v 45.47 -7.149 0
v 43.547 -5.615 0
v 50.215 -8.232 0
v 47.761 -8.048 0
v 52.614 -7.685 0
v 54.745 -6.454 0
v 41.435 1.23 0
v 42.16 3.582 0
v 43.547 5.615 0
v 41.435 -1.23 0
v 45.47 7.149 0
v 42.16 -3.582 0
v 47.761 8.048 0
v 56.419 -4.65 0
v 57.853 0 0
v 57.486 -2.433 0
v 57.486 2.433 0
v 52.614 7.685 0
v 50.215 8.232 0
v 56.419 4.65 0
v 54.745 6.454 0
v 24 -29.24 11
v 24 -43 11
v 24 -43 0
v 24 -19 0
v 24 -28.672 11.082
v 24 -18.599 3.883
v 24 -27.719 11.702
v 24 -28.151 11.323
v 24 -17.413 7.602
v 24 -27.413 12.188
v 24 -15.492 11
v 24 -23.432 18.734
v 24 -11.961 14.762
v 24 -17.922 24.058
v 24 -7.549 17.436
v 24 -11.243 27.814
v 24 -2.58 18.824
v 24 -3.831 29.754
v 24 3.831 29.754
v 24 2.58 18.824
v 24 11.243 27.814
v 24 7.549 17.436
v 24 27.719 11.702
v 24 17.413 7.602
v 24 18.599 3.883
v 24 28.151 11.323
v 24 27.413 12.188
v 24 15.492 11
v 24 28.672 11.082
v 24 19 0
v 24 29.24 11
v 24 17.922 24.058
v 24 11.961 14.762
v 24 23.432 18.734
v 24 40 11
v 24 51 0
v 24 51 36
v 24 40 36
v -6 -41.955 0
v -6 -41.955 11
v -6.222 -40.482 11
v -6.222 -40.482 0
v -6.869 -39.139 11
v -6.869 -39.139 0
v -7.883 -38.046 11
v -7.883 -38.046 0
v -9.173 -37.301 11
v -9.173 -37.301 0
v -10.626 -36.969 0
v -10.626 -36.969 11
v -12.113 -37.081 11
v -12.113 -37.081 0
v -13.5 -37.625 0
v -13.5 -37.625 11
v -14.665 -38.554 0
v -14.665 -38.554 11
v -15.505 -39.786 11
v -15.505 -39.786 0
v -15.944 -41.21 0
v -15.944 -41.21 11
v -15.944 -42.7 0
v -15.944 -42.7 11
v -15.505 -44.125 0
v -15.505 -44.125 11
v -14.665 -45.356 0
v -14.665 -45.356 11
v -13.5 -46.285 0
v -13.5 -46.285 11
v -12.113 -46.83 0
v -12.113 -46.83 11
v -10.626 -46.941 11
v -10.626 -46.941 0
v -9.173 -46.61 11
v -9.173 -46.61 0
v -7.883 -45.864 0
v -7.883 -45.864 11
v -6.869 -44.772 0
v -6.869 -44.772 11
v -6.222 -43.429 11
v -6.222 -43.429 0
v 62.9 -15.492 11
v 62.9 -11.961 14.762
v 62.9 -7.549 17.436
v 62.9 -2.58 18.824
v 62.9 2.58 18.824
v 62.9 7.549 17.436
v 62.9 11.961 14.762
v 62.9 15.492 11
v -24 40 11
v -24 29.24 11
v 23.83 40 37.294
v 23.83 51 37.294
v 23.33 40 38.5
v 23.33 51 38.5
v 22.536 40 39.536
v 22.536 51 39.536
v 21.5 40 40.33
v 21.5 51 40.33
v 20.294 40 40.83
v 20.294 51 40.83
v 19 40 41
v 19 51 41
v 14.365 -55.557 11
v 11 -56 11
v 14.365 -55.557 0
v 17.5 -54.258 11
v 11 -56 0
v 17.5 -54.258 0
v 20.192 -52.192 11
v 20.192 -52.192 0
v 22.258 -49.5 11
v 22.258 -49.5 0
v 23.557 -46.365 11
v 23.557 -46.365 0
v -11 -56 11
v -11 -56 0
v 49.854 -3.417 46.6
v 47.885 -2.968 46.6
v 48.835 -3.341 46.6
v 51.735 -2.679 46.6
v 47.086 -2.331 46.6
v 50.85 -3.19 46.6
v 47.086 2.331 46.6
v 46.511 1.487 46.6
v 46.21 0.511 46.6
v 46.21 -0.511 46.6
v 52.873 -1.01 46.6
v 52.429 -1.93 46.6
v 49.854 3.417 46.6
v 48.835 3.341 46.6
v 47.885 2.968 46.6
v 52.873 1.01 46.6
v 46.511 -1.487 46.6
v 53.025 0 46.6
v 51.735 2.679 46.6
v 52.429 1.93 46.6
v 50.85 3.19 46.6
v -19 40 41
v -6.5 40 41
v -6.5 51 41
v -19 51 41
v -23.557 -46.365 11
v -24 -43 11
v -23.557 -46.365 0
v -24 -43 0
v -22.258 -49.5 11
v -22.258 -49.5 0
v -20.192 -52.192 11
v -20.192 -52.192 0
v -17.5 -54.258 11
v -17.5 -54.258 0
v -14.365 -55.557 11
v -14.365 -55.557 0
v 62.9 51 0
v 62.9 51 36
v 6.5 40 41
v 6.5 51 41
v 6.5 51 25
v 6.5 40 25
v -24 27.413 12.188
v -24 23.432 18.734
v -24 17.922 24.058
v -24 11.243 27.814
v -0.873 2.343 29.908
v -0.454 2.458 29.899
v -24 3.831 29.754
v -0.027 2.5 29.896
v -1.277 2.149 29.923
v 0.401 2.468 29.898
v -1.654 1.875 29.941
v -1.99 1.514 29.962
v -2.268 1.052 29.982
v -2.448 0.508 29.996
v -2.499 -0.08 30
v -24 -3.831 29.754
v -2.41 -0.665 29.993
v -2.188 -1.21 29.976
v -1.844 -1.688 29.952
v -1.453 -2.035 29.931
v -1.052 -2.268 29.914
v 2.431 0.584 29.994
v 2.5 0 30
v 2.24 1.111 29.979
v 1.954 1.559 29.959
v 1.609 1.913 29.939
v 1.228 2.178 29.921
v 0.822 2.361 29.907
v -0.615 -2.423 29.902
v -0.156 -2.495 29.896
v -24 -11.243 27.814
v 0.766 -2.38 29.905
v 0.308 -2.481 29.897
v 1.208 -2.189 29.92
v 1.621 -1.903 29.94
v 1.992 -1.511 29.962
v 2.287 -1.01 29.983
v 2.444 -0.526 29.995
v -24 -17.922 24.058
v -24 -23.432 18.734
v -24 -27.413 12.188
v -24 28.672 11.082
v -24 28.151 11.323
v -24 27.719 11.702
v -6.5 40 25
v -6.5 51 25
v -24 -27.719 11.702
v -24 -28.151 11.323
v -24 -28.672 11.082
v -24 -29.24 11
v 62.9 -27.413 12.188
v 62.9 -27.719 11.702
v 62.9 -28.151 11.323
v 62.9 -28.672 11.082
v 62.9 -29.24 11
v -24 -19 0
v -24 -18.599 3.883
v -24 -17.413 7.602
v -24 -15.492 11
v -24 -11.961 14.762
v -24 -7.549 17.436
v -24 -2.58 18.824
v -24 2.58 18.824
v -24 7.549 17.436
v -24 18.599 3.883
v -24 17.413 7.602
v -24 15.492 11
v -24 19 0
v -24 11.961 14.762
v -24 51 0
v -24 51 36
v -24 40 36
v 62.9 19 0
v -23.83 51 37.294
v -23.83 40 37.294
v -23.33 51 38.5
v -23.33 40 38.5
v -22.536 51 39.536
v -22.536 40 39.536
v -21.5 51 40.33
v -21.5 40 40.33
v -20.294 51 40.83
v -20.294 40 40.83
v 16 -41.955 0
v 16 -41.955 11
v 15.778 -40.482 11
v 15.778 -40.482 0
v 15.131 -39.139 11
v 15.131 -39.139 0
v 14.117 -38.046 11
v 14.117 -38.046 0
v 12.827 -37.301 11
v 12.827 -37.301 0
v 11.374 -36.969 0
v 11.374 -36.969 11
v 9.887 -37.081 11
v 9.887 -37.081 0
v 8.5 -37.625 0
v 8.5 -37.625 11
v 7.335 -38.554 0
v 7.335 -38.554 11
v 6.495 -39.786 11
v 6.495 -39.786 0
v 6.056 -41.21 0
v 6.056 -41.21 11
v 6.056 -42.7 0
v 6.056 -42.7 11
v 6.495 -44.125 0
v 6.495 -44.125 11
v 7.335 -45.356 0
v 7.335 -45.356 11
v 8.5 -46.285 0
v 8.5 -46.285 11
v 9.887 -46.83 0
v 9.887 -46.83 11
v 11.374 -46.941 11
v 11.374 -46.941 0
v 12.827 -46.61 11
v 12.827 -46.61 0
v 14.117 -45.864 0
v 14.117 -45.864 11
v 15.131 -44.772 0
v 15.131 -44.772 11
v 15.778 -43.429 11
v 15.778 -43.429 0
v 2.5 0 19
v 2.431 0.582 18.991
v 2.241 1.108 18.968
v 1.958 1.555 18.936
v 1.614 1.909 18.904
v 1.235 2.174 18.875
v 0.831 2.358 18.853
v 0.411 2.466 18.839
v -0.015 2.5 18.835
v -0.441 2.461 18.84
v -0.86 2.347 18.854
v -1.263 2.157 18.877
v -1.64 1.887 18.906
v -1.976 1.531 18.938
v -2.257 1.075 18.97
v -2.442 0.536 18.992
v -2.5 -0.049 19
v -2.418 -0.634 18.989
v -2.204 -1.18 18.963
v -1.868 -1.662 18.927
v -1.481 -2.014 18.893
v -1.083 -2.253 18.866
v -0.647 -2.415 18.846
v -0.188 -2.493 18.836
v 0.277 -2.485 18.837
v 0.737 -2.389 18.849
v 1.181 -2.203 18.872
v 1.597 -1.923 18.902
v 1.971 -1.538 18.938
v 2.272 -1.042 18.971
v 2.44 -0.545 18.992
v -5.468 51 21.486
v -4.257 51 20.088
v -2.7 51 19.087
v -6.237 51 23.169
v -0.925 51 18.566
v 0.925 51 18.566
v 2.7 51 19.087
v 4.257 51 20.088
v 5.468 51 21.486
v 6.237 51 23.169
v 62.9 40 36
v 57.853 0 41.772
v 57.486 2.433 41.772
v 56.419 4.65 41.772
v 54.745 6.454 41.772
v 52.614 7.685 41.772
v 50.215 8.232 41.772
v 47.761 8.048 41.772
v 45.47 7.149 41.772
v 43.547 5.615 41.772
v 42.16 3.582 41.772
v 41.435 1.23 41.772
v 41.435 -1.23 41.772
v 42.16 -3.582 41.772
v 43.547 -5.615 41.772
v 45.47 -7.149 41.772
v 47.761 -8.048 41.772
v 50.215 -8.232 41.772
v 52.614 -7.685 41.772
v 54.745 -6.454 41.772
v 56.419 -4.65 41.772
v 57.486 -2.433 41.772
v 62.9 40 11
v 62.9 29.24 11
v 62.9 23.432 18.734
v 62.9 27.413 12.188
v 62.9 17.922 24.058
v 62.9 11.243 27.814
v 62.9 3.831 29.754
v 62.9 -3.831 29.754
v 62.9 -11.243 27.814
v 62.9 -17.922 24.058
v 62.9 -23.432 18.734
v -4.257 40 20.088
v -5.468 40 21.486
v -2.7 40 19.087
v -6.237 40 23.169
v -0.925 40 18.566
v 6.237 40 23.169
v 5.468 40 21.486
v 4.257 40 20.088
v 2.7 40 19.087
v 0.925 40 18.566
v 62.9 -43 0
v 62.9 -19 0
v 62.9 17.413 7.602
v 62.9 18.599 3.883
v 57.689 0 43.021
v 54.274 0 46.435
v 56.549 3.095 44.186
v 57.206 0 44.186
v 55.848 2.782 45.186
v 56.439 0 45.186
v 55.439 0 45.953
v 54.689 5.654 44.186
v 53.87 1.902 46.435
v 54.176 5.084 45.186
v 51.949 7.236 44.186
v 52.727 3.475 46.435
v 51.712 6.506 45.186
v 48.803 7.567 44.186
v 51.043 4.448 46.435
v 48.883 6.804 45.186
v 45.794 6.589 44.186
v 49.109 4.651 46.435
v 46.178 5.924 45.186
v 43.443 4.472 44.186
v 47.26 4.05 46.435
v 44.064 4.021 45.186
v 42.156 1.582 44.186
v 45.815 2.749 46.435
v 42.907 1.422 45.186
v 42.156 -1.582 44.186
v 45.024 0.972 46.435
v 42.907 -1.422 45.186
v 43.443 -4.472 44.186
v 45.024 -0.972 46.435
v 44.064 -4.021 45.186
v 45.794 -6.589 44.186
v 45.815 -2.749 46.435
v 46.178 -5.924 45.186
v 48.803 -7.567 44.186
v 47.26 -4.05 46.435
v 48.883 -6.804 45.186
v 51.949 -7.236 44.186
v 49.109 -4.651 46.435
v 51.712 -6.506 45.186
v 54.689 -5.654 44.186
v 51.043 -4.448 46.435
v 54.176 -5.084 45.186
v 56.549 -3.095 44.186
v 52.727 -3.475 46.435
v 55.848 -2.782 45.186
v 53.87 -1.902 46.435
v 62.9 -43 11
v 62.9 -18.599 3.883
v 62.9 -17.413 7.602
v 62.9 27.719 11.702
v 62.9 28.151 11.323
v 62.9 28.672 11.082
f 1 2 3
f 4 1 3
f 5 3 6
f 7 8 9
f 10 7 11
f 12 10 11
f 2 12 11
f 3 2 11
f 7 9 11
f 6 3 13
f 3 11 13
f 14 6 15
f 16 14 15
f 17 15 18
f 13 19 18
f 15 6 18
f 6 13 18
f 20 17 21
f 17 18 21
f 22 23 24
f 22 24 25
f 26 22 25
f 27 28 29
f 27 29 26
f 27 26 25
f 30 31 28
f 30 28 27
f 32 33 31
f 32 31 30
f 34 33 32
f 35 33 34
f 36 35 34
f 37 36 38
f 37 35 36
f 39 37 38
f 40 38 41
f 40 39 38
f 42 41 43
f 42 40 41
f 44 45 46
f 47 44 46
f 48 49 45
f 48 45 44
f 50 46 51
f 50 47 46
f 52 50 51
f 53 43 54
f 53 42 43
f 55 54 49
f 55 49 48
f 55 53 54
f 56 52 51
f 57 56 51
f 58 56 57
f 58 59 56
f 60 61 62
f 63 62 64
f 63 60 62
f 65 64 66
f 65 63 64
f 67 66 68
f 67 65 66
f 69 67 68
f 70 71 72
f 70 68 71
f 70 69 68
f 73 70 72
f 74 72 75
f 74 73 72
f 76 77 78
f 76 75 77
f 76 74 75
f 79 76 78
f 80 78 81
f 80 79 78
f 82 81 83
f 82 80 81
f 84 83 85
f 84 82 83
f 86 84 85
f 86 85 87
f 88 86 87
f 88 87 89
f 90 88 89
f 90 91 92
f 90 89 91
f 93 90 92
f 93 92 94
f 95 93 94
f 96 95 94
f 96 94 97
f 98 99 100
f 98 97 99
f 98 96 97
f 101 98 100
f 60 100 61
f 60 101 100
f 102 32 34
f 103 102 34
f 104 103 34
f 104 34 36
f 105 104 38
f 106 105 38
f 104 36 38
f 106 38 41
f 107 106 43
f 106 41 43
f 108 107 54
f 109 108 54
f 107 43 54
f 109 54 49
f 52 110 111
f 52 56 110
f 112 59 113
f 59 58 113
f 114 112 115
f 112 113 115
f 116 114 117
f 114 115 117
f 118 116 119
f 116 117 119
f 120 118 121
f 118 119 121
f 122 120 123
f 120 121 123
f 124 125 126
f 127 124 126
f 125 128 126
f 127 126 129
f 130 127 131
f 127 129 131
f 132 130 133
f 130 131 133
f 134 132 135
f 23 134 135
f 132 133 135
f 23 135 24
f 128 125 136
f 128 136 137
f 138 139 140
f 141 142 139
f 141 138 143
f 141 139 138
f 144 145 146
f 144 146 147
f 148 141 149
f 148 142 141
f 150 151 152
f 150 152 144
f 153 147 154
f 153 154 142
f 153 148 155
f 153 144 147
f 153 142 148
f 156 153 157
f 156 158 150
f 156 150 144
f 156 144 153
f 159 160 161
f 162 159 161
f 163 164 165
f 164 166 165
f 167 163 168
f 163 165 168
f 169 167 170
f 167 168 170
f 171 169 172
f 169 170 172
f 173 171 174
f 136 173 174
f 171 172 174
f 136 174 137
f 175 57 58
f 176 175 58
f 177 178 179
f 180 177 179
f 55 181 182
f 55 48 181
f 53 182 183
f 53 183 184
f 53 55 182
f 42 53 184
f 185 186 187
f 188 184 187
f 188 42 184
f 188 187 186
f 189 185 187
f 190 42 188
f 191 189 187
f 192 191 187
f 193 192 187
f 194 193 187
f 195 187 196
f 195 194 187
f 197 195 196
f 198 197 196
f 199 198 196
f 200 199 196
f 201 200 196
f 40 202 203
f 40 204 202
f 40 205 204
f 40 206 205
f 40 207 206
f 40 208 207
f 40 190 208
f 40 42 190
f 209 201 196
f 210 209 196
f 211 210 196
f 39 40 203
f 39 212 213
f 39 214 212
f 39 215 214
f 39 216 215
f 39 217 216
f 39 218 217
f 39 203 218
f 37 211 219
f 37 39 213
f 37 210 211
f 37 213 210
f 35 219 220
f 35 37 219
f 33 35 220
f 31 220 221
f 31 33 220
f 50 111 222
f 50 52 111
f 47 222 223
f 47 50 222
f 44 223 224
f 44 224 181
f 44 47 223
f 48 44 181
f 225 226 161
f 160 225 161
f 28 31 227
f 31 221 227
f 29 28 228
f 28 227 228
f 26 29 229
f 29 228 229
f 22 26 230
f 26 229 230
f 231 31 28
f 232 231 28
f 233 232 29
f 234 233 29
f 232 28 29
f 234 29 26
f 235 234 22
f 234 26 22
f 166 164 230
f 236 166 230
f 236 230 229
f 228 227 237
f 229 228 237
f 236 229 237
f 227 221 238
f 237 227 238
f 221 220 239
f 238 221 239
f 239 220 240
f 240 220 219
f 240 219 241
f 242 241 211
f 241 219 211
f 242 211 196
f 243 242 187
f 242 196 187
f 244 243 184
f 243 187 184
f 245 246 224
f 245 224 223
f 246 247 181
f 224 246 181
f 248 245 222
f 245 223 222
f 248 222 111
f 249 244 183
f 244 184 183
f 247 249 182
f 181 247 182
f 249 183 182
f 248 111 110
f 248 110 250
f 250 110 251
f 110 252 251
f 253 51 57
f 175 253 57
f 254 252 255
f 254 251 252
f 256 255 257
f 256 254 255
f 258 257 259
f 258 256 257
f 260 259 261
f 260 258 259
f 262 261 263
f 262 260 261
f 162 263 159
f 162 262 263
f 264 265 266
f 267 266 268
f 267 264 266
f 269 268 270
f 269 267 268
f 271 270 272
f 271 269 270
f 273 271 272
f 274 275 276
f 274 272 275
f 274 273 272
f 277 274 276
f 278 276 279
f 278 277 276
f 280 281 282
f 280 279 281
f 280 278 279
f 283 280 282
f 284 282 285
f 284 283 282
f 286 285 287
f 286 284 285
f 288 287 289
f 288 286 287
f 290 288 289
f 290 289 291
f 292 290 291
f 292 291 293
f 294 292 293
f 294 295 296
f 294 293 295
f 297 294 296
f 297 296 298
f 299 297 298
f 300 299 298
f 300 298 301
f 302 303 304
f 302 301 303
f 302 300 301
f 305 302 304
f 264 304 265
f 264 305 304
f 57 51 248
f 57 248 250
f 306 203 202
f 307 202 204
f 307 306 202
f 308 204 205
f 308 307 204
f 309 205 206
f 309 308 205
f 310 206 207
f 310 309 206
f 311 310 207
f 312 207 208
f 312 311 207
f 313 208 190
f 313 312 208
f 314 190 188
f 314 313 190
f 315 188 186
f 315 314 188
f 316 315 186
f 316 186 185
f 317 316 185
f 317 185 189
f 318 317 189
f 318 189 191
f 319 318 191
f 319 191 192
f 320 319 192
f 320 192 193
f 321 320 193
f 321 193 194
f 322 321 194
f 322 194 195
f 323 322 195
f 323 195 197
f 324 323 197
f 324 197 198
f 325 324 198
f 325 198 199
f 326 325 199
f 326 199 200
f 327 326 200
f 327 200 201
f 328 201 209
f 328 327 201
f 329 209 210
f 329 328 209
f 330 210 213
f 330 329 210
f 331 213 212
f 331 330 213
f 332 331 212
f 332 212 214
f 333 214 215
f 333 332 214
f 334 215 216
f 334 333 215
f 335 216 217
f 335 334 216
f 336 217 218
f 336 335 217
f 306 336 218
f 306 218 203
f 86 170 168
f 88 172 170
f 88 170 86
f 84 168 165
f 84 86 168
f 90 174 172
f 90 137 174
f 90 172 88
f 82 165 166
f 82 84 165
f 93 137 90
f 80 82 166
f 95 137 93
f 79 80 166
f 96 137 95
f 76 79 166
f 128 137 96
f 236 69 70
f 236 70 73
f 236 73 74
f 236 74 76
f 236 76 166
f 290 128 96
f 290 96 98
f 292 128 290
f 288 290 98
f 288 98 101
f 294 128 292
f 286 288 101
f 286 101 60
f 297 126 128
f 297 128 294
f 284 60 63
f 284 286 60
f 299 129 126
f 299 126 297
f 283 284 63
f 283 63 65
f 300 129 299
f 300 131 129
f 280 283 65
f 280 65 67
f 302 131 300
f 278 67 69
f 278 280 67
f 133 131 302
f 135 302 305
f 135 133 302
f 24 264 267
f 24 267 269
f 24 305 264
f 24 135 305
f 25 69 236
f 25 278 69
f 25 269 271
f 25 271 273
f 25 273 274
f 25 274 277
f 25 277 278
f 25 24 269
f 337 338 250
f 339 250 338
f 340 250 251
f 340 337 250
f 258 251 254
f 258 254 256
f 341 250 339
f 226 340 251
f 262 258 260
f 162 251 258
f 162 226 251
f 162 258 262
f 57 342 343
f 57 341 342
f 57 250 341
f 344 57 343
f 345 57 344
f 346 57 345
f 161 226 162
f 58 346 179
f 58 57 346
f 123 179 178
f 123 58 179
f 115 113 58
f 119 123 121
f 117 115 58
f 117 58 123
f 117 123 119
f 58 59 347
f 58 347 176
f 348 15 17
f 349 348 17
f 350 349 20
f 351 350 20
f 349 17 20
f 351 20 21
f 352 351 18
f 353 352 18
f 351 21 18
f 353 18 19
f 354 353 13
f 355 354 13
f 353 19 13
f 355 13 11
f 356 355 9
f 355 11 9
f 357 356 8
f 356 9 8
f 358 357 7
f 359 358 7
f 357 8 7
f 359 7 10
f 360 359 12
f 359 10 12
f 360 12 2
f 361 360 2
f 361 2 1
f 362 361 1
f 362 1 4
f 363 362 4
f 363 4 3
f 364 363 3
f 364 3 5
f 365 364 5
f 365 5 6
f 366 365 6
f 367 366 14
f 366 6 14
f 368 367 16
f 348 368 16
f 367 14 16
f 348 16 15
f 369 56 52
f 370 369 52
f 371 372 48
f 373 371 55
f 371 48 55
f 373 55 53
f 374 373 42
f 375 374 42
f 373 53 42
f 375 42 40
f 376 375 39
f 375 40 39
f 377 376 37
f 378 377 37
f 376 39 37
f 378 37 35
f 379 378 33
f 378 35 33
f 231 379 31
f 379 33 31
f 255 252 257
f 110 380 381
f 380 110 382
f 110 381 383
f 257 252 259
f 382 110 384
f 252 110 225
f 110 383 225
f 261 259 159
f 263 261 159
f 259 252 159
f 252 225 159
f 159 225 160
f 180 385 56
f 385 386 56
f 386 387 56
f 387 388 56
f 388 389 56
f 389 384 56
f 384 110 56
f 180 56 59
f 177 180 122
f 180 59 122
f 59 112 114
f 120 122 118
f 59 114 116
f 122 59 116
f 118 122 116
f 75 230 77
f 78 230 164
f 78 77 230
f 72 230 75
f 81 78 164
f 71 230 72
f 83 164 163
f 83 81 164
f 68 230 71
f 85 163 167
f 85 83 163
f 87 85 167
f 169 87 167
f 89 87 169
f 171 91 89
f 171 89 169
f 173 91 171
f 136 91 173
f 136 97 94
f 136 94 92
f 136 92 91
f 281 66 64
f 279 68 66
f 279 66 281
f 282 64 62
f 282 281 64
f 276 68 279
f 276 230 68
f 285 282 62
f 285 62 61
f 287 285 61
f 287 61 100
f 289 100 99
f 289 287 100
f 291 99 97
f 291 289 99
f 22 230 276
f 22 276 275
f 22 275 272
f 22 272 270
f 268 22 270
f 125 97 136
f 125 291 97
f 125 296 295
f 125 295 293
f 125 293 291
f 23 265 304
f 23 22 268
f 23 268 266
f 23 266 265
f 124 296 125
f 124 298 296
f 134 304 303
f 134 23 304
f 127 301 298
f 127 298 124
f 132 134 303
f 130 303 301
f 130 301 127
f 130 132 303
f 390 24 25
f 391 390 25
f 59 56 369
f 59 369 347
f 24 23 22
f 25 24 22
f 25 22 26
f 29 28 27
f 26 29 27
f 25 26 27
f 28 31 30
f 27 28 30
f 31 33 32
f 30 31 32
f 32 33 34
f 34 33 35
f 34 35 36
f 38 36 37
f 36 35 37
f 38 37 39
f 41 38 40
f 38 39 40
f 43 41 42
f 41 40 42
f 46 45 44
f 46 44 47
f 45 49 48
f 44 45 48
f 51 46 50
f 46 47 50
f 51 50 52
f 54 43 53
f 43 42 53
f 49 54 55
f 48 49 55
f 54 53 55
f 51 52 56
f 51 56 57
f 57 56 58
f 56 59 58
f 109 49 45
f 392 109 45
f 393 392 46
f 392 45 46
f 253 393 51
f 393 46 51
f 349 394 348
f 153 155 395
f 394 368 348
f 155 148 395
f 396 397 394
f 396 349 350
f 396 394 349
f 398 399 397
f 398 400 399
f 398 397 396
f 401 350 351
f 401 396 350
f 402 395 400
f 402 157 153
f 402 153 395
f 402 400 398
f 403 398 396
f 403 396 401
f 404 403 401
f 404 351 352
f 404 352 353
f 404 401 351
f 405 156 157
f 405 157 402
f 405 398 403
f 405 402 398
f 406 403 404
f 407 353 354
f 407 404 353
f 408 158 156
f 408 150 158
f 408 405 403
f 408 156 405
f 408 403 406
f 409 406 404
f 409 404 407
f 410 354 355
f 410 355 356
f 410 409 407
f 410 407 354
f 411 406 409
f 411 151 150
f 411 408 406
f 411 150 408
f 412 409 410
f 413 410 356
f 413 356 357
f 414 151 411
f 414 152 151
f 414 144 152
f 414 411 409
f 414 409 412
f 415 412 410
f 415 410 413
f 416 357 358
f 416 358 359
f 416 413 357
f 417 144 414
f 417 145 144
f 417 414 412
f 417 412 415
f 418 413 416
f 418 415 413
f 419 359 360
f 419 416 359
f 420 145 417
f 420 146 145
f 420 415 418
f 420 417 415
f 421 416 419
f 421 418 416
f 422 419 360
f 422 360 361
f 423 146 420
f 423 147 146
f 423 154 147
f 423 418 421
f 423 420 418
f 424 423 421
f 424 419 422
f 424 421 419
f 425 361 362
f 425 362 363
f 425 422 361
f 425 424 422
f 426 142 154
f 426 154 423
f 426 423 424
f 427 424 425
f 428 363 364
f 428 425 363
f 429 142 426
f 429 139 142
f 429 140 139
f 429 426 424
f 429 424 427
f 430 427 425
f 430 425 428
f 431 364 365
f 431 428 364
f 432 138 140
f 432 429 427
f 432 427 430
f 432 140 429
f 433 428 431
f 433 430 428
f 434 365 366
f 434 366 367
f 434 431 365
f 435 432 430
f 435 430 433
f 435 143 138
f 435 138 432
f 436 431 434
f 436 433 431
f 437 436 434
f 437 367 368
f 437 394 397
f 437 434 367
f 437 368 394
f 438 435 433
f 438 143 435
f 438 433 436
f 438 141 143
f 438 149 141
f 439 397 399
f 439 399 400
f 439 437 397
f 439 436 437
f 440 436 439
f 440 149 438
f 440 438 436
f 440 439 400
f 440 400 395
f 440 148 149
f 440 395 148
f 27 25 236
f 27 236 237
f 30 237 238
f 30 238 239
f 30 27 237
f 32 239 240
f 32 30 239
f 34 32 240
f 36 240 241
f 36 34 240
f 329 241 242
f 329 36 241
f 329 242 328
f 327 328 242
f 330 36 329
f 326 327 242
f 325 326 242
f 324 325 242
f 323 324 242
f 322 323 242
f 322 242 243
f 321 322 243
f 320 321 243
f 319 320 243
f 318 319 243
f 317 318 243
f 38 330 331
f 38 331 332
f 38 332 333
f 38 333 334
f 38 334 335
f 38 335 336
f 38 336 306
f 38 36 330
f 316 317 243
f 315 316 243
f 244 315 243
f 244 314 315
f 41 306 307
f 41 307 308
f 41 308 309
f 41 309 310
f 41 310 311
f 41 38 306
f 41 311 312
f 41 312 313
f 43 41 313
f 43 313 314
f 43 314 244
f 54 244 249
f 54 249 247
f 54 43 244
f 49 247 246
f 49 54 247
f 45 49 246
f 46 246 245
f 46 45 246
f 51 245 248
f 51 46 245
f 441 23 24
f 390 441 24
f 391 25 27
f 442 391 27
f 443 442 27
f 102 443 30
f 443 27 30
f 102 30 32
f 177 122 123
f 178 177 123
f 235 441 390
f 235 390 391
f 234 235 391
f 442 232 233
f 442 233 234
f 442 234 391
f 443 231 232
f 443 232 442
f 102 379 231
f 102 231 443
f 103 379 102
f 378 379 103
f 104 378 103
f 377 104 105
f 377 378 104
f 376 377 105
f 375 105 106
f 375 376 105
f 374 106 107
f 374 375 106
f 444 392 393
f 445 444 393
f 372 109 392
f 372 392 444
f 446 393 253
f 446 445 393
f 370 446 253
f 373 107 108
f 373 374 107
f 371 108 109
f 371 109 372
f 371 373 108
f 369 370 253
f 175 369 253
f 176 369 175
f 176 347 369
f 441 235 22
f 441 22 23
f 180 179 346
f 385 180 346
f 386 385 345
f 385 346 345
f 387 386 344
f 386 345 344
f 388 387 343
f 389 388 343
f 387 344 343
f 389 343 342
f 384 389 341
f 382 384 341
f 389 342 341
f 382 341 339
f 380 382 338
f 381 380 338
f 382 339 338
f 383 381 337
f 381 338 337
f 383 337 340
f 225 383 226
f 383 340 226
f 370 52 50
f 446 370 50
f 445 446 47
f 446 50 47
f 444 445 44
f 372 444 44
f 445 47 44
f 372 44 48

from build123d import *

# Parameters (mm, degrees)
F0_W      = 11
F0_H      = 30
F1_DEPTH  = 24
F3_DEPTH  = 11
F4_R      = 2.5
F4_R_2    = 5
F5_DEPTH  = 41.001
F6_R      = 13
F7_R      = 5
F8_R      = 2
F9_R      = 8.2551994861
F10_DEPTH = 46.6
F11_R     = 4.8284271247
F12_DEPTH = 38.9


with BuildPart() as f1:
    # F0 (on Right) → F1 (new body, symmetric)
    with BuildSketch(Plane.YZ):
        with BuildLine():
            Line((-56, 0), (-30, 0))
            ThreePointArc((-30, 0), (-29.4730143031, 5.5983415304), (-27.9105714739, 11))
            Line((-27.9105714739, 11), (-56, 11))
            Line((-56, 11), (-56, 0))
        make_face()
        with BuildLine():
            Line((-30, 0), (-19, 0))
            ThreePointArc((-19, 0), (-18.1017503893, 5.7729223833), (-15.4919333848, 11))
            Line((-15.4919333848, 11), (-27.9105714739, 11))
            ThreePointArc((-27.9105714739, 11), (-29.4730143031, 5.5983415304), (-30, 0))
        make_face()
        with BuildLine():
            ThreePointArc((15.4919333848, 11), (18.1017503893, 5.7729223833), (19, 0))
            Line((19, 0), (30, 0))
            ThreePointArc((30, 0), (29.4730143031, 5.5983415304), (27.9105714739, 11))
            Line((27.9105714739, 11), (15.4919333848, 11))
        make_face()
        with BuildLine():
            ThreePointArc((-15.4919333848, 11), (0, 19), (15.4919333848, 11))
            Line((15.4919333848, 11), (27.9105714739, 11))
            ThreePointArc((27.9105714739, 11), (0, 30), (-27.9105714739, 11))
            Line((-27.9105714739, 11), (-15.4919333848, 11))
        make_face()
        with BuildLine():
            ThreePointArc((27.9105714739, 11), (29.4730143031, 5.5983415304), (30, 0))
            Line((30, 0), (51, 0))
            Line((51, 0), (51, 11))
            Line((51, 11), (40, 11))
            Line((40, 11), (27.9105714739, 11))
        make_face()
        with Locations((45.5, 26)):
            Rectangle(F0_W, F0_H)
    extrude(amount=F1_DEPTH, both=True)

    # F2 (on face) → F3 (cut, through all)
    with BuildSketch(Plane(origin=(0, 51, 0), x_dir=(-1, 0, 0), z_dir=(0, 1, 0))):
        with BuildLine():
            ThreePointArc((-6.5, 25), (0, 18.5), (6.5, 25))
            ThreePointArc((6.5, 25), (0, 31.5), (-6.5, 25))
        make_face()
        with BuildLine():
            ThreePointArc((-6.5, 25), (0, 31.5), (6.5, 25))
            Line((6.5, 25), (6.5, 41))
            Line((6.5, 41), (-6.5, 41))
            Line((-6.5, 41), (-6.5, 25))
        make_face()
    extrude(amount=-F3_DEPTH, mode=Mode.SUBTRACT)

    # F4 (on Top) → F5 (cut, through all)
    with BuildSketch(Plane.XY):
        Circle(F4_R)
        with Locations((-11, -41.955285737)):
            Circle(F4_R_2)
        with Locations((11, -41.955285737)):
            Circle(F4_R_2)
    extrude(amount=F5_DEPTH, mode=Mode.SUBTRACT)

    # F6
    f6_edges = [f1.edges().sort_by_distance(p)[0] for p in [
        (24, -56, 5.5),
        (-24, -56, 5.5),
    ]]
    fillet(f6_edges, radius=F6_R)

    # F7
    f7_edges = [f1.edges().sort_by_distance(p)[0] for p in [
        (24, 45.5, 41),
        (-24, 45.5, 41),
    ]]
    fillet(f7_edges, radius=F7_R)

    # F8
    f8_edges = [f1.edges().sort_by_distance(p)[0] for p in [
        (0, -27.910571, 11),
        (0, 27.910571, 11),
    ]]
    fillet(f8_edges, radius=F8_R)


with BuildPart() as f10:
    # F9 (on Top) → F10 (new body)
    with BuildSketch(Plane.XY):
        with Locations((49.5980121195, 0)):
            Circle(F9_R)
    extrude(amount=F10_DEPTH)

    # F11
    f11_edges = [f10.edges().sort_by_distance(p)[0] for p in [
        (41.342813, 0, 46.6),
    ]]
    fillet(f11_edges, radius=F11_R)


with BuildPart() as f12:
    # F12 (new): a face of the model
    f12_faces = [f1.part.faces().sort_by_distance(p)[0] for p in [
        (24, 34.6201915172, 9.9934216374),
    ]]
    extrude(f12_faces, amount=F12_DEPTH)


solid = Compound([f1.part, f10.part, f12.part])
